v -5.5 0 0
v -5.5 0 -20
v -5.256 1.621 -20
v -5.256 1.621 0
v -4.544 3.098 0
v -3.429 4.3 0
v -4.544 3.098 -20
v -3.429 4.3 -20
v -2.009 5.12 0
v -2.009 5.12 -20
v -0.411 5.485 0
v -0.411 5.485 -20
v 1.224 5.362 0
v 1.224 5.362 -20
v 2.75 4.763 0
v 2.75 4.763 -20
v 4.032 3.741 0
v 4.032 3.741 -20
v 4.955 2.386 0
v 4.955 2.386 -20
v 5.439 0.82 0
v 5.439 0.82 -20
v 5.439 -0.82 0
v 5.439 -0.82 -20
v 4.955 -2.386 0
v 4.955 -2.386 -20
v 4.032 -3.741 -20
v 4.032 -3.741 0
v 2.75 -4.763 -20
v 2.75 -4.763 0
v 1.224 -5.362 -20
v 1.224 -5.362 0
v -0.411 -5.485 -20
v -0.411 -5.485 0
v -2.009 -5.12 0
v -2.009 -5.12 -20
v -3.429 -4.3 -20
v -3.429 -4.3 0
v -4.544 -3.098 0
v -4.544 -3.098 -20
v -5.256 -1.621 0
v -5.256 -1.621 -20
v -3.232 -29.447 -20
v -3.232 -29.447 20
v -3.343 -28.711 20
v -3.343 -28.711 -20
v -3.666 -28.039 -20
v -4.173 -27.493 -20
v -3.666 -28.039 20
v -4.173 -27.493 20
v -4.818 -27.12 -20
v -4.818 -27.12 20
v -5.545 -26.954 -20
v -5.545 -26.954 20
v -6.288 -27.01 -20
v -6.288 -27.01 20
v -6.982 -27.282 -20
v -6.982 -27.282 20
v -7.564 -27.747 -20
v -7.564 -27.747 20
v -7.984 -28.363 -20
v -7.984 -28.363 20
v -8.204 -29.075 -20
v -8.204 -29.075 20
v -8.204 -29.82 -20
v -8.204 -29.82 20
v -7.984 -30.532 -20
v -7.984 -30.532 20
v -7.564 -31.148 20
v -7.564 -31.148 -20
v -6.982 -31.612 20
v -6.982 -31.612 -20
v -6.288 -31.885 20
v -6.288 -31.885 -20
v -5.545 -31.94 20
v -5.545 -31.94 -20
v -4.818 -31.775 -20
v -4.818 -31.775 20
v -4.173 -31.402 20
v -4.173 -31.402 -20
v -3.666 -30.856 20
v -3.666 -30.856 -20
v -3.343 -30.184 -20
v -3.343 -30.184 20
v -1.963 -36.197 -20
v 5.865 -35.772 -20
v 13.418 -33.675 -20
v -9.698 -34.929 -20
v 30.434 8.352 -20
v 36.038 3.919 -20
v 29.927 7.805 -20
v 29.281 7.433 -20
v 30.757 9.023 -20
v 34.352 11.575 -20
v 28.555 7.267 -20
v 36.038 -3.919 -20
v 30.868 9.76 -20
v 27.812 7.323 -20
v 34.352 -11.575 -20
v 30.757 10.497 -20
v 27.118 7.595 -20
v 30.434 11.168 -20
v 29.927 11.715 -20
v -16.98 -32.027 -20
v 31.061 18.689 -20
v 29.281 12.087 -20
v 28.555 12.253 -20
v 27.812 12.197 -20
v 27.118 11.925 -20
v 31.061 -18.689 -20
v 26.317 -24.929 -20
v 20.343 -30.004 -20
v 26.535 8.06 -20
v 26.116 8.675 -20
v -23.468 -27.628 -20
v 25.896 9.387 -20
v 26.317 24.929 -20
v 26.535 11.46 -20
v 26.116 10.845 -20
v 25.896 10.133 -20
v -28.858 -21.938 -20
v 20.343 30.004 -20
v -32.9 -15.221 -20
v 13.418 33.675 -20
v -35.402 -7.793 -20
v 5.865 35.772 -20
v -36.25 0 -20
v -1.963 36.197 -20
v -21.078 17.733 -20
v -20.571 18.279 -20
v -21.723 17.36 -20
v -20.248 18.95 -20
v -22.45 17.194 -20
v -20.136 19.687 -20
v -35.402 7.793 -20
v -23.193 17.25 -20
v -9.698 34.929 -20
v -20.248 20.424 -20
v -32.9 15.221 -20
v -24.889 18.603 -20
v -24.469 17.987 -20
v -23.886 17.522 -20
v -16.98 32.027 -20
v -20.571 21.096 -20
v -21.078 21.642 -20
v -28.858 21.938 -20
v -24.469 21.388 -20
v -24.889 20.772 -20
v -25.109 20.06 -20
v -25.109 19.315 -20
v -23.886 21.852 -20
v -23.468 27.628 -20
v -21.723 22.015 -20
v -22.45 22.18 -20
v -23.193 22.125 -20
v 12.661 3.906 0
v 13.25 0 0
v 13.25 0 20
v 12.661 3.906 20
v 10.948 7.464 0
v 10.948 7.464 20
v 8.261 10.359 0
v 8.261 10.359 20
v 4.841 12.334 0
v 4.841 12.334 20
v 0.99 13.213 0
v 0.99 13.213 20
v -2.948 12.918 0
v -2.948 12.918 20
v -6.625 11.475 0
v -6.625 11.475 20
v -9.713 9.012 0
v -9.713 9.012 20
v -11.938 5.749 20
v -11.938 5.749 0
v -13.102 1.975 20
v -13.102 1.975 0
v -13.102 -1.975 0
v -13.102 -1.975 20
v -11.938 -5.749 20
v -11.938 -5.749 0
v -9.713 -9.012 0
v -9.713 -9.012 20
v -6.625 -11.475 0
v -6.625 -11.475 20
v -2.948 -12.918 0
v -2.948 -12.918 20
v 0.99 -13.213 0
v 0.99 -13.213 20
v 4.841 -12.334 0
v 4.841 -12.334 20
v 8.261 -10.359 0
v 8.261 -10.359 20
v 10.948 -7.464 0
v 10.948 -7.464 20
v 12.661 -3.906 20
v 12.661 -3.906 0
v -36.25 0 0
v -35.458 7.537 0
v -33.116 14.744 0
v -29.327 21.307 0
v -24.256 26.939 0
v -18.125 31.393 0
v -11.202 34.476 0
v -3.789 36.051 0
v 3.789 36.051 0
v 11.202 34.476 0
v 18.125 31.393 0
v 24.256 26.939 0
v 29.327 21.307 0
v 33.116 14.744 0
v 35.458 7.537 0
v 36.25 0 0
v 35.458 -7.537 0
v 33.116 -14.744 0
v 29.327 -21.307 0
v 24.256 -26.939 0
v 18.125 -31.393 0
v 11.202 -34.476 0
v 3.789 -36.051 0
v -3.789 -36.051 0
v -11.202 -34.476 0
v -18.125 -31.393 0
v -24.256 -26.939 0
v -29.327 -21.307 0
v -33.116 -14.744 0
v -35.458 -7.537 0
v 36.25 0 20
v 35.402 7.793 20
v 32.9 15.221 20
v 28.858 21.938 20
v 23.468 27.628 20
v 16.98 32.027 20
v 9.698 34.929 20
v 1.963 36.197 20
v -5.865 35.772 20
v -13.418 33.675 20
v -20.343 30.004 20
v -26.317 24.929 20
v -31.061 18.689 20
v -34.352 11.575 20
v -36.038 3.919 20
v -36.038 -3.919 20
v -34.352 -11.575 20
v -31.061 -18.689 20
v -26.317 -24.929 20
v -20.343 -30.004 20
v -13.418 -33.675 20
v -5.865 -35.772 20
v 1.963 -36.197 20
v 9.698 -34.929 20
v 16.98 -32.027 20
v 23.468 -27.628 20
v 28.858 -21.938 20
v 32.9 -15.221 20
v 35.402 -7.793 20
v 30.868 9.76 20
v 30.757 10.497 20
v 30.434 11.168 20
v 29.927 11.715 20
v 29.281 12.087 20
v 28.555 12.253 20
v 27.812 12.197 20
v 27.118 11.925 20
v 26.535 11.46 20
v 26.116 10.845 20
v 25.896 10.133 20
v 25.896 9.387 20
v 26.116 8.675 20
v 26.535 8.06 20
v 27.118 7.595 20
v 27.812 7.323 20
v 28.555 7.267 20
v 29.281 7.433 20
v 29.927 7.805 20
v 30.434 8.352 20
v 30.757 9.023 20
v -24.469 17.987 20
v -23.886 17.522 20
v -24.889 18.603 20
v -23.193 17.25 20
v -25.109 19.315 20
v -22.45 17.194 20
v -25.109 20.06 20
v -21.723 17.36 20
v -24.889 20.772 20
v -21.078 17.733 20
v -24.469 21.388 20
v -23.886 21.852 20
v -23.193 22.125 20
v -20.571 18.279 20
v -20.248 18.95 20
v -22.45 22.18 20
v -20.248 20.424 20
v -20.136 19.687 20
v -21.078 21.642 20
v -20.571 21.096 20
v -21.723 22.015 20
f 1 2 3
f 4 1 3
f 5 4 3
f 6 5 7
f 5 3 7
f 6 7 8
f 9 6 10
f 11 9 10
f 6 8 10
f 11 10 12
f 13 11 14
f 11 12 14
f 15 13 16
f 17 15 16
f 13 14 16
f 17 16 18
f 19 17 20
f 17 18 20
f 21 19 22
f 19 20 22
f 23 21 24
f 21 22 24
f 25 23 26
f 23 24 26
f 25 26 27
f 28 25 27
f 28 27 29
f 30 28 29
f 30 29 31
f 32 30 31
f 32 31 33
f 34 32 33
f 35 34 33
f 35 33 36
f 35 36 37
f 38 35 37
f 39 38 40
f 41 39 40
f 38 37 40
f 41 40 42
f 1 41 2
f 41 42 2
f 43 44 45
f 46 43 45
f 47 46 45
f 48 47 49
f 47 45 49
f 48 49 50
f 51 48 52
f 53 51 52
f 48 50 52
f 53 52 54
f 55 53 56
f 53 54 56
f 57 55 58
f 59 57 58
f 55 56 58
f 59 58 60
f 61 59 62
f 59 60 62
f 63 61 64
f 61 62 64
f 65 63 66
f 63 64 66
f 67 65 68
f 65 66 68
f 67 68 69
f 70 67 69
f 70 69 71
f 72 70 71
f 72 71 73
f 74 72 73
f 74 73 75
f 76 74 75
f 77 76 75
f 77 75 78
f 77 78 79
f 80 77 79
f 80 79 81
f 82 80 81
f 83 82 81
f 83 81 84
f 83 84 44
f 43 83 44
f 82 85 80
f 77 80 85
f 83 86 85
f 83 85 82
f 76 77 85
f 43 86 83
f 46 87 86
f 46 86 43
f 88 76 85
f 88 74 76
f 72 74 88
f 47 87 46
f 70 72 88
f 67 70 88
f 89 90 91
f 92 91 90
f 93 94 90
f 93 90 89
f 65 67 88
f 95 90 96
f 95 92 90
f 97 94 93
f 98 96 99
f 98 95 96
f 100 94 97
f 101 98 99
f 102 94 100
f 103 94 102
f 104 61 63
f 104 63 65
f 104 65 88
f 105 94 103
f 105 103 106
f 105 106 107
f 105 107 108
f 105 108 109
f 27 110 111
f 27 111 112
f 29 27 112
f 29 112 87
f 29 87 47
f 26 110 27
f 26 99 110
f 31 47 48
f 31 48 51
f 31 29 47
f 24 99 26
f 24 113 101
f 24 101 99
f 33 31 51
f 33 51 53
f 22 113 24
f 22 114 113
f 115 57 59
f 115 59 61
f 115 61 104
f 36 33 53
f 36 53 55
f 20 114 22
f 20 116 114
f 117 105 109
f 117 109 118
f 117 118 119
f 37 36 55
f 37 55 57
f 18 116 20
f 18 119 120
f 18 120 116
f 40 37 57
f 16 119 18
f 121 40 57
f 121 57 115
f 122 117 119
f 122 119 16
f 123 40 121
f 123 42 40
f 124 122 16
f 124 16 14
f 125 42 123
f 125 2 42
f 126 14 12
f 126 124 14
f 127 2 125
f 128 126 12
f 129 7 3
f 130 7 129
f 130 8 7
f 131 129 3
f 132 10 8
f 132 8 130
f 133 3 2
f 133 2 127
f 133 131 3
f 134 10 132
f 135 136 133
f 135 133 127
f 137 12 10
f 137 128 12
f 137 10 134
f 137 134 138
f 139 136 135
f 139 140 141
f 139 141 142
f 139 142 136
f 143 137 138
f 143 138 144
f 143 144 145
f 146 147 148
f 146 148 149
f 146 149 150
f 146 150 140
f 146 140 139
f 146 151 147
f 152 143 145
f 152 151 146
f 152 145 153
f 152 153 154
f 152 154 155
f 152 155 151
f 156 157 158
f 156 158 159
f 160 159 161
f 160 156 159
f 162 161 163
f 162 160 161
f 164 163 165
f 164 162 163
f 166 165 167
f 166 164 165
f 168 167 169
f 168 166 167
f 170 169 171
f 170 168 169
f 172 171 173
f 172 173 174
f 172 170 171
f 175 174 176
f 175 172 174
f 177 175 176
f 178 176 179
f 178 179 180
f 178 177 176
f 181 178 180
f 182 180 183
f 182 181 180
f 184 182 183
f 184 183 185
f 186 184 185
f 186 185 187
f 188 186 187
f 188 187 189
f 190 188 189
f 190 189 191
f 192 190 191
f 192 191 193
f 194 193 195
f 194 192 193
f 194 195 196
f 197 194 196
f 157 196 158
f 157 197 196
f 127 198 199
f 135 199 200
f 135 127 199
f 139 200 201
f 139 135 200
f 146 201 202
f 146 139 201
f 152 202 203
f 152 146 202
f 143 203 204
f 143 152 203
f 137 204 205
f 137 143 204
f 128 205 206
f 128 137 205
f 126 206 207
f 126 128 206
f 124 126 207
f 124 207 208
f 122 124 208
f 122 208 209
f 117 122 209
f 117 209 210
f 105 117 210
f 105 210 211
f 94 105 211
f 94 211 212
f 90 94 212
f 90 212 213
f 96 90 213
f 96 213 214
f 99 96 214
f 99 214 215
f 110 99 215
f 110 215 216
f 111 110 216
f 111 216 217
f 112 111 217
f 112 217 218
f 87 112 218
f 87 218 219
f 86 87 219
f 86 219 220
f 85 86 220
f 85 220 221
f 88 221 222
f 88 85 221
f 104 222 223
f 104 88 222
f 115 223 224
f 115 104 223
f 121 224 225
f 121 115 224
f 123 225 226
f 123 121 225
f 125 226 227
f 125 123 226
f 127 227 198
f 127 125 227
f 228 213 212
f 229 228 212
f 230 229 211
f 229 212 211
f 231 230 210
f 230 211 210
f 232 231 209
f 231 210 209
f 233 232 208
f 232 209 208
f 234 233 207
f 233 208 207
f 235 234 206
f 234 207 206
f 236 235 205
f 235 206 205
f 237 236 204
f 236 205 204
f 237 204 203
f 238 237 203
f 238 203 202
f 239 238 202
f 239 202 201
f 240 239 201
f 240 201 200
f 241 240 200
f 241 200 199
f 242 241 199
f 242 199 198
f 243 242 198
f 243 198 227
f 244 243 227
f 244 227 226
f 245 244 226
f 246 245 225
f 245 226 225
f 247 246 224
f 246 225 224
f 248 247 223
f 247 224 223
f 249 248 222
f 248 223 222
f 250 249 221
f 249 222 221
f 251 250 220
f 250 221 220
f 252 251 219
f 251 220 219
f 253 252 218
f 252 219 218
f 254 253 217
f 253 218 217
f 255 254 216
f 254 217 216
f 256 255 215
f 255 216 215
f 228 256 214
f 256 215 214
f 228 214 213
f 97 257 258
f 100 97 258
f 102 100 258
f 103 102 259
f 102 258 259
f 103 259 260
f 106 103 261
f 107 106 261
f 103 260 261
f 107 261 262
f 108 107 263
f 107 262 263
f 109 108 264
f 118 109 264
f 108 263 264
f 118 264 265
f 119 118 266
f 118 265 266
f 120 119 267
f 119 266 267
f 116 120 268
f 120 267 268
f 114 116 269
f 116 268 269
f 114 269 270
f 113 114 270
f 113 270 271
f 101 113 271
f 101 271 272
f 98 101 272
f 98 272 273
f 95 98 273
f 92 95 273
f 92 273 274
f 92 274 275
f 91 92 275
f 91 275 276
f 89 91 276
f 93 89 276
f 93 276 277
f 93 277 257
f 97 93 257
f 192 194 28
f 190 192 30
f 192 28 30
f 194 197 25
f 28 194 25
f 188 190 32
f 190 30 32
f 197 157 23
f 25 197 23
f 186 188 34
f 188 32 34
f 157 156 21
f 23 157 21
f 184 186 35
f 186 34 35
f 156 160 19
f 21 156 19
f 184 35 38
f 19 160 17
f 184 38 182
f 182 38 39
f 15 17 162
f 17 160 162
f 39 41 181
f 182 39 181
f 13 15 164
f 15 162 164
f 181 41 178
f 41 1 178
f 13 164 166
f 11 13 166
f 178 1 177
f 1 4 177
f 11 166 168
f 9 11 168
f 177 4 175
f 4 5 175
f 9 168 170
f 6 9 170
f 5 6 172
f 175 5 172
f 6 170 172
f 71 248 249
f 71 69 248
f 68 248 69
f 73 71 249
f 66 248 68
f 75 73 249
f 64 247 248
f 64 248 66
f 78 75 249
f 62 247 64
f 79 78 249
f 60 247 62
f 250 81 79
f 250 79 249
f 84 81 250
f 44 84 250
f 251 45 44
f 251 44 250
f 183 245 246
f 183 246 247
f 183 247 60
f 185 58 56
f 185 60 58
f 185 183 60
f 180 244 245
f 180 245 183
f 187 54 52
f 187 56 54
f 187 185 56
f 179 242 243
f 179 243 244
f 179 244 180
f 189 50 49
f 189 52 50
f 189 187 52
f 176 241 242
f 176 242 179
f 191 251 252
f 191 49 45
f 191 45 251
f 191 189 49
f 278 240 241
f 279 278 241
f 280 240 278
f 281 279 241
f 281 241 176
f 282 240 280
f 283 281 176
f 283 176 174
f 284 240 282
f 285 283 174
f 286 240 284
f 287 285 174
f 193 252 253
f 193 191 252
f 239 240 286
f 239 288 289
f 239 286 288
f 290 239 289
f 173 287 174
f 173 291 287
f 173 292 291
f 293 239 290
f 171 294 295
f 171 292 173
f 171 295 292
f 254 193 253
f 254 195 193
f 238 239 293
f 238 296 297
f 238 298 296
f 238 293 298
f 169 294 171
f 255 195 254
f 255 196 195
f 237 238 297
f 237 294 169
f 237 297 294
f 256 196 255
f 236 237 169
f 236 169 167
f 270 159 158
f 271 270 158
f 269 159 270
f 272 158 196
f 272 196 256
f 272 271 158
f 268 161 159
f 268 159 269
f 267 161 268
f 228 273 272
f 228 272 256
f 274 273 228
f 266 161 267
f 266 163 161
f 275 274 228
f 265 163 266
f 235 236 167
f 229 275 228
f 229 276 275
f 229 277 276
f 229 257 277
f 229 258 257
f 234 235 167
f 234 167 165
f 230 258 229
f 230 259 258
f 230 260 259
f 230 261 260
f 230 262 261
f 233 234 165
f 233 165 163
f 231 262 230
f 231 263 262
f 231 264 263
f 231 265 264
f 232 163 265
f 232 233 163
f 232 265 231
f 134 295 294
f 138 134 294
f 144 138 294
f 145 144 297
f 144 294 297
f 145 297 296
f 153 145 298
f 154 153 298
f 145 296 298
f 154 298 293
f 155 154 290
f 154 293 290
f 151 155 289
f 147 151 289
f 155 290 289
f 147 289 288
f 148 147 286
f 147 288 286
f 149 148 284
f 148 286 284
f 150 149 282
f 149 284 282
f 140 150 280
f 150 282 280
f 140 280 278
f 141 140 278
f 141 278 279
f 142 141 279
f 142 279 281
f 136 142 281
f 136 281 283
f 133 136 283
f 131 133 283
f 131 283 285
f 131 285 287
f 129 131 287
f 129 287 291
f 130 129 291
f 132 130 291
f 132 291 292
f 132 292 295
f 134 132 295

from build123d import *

# Parameters (mm, degrees)
SKETCH1_R           = 36.25
SKETCH1_R_2         = 13.25
BOSS_EXTRUDE1_DEPTH = 20
BOSS_EXTRUDE3_START = 20
SKETCH2_R           = 36.25
SKETCH2_R_2         = 5.5
BOSS_EXTRUDE3_DEPTH = 20
SKETCH3_R           = 2.5
CUT_EXTRUDE1_DEPTH  = 66.024034018


with BuildPart() as part:
    # Sketch1 → Boss-Extrude1 (new body)
    with BuildSketch(Plane.XY):
        Circle(SKETCH1_R)
        Circle(SKETCH1_R_2, mode=Mode.SUBTRACT)
    extrude(amount=BOSS_EXTRUDE1_DEPTH)

    # Sketch2 → Boss-Extrude3 (add)
    with BuildSketch(Plane(origin=(0, 0, 0), x_dir=(-1, 0, 0), z_dir=(0, 0, -1)).offset(BOSS_EXTRUDE3_START)):
        Circle(SKETCH2_R)
        Circle(SKETCH2_R_2, mode=Mode.SUBTRACT)
    extrude(amount=-BOSS_EXTRUDE3_DEPTH)

    # Sketch3 → Cut-Extrude1 (cut, through all)
    with BuildSketch(Plane.XY.offset(20)):
        with Locations((-5.731515756, -29.447406119)):
            Circle(SKETCH3_R)
        with Locations((-22.636443897, 19.687341306)):
            Circle(SKETCH3_R)
        with Locations((28.367959653, 9.760064813)):
            Circle(SKETCH3_R)
    extrude(amount=-CUT_EXTRUDE1_DEPTH, mode=Mode.SUBTRACT)


solid = part.part
